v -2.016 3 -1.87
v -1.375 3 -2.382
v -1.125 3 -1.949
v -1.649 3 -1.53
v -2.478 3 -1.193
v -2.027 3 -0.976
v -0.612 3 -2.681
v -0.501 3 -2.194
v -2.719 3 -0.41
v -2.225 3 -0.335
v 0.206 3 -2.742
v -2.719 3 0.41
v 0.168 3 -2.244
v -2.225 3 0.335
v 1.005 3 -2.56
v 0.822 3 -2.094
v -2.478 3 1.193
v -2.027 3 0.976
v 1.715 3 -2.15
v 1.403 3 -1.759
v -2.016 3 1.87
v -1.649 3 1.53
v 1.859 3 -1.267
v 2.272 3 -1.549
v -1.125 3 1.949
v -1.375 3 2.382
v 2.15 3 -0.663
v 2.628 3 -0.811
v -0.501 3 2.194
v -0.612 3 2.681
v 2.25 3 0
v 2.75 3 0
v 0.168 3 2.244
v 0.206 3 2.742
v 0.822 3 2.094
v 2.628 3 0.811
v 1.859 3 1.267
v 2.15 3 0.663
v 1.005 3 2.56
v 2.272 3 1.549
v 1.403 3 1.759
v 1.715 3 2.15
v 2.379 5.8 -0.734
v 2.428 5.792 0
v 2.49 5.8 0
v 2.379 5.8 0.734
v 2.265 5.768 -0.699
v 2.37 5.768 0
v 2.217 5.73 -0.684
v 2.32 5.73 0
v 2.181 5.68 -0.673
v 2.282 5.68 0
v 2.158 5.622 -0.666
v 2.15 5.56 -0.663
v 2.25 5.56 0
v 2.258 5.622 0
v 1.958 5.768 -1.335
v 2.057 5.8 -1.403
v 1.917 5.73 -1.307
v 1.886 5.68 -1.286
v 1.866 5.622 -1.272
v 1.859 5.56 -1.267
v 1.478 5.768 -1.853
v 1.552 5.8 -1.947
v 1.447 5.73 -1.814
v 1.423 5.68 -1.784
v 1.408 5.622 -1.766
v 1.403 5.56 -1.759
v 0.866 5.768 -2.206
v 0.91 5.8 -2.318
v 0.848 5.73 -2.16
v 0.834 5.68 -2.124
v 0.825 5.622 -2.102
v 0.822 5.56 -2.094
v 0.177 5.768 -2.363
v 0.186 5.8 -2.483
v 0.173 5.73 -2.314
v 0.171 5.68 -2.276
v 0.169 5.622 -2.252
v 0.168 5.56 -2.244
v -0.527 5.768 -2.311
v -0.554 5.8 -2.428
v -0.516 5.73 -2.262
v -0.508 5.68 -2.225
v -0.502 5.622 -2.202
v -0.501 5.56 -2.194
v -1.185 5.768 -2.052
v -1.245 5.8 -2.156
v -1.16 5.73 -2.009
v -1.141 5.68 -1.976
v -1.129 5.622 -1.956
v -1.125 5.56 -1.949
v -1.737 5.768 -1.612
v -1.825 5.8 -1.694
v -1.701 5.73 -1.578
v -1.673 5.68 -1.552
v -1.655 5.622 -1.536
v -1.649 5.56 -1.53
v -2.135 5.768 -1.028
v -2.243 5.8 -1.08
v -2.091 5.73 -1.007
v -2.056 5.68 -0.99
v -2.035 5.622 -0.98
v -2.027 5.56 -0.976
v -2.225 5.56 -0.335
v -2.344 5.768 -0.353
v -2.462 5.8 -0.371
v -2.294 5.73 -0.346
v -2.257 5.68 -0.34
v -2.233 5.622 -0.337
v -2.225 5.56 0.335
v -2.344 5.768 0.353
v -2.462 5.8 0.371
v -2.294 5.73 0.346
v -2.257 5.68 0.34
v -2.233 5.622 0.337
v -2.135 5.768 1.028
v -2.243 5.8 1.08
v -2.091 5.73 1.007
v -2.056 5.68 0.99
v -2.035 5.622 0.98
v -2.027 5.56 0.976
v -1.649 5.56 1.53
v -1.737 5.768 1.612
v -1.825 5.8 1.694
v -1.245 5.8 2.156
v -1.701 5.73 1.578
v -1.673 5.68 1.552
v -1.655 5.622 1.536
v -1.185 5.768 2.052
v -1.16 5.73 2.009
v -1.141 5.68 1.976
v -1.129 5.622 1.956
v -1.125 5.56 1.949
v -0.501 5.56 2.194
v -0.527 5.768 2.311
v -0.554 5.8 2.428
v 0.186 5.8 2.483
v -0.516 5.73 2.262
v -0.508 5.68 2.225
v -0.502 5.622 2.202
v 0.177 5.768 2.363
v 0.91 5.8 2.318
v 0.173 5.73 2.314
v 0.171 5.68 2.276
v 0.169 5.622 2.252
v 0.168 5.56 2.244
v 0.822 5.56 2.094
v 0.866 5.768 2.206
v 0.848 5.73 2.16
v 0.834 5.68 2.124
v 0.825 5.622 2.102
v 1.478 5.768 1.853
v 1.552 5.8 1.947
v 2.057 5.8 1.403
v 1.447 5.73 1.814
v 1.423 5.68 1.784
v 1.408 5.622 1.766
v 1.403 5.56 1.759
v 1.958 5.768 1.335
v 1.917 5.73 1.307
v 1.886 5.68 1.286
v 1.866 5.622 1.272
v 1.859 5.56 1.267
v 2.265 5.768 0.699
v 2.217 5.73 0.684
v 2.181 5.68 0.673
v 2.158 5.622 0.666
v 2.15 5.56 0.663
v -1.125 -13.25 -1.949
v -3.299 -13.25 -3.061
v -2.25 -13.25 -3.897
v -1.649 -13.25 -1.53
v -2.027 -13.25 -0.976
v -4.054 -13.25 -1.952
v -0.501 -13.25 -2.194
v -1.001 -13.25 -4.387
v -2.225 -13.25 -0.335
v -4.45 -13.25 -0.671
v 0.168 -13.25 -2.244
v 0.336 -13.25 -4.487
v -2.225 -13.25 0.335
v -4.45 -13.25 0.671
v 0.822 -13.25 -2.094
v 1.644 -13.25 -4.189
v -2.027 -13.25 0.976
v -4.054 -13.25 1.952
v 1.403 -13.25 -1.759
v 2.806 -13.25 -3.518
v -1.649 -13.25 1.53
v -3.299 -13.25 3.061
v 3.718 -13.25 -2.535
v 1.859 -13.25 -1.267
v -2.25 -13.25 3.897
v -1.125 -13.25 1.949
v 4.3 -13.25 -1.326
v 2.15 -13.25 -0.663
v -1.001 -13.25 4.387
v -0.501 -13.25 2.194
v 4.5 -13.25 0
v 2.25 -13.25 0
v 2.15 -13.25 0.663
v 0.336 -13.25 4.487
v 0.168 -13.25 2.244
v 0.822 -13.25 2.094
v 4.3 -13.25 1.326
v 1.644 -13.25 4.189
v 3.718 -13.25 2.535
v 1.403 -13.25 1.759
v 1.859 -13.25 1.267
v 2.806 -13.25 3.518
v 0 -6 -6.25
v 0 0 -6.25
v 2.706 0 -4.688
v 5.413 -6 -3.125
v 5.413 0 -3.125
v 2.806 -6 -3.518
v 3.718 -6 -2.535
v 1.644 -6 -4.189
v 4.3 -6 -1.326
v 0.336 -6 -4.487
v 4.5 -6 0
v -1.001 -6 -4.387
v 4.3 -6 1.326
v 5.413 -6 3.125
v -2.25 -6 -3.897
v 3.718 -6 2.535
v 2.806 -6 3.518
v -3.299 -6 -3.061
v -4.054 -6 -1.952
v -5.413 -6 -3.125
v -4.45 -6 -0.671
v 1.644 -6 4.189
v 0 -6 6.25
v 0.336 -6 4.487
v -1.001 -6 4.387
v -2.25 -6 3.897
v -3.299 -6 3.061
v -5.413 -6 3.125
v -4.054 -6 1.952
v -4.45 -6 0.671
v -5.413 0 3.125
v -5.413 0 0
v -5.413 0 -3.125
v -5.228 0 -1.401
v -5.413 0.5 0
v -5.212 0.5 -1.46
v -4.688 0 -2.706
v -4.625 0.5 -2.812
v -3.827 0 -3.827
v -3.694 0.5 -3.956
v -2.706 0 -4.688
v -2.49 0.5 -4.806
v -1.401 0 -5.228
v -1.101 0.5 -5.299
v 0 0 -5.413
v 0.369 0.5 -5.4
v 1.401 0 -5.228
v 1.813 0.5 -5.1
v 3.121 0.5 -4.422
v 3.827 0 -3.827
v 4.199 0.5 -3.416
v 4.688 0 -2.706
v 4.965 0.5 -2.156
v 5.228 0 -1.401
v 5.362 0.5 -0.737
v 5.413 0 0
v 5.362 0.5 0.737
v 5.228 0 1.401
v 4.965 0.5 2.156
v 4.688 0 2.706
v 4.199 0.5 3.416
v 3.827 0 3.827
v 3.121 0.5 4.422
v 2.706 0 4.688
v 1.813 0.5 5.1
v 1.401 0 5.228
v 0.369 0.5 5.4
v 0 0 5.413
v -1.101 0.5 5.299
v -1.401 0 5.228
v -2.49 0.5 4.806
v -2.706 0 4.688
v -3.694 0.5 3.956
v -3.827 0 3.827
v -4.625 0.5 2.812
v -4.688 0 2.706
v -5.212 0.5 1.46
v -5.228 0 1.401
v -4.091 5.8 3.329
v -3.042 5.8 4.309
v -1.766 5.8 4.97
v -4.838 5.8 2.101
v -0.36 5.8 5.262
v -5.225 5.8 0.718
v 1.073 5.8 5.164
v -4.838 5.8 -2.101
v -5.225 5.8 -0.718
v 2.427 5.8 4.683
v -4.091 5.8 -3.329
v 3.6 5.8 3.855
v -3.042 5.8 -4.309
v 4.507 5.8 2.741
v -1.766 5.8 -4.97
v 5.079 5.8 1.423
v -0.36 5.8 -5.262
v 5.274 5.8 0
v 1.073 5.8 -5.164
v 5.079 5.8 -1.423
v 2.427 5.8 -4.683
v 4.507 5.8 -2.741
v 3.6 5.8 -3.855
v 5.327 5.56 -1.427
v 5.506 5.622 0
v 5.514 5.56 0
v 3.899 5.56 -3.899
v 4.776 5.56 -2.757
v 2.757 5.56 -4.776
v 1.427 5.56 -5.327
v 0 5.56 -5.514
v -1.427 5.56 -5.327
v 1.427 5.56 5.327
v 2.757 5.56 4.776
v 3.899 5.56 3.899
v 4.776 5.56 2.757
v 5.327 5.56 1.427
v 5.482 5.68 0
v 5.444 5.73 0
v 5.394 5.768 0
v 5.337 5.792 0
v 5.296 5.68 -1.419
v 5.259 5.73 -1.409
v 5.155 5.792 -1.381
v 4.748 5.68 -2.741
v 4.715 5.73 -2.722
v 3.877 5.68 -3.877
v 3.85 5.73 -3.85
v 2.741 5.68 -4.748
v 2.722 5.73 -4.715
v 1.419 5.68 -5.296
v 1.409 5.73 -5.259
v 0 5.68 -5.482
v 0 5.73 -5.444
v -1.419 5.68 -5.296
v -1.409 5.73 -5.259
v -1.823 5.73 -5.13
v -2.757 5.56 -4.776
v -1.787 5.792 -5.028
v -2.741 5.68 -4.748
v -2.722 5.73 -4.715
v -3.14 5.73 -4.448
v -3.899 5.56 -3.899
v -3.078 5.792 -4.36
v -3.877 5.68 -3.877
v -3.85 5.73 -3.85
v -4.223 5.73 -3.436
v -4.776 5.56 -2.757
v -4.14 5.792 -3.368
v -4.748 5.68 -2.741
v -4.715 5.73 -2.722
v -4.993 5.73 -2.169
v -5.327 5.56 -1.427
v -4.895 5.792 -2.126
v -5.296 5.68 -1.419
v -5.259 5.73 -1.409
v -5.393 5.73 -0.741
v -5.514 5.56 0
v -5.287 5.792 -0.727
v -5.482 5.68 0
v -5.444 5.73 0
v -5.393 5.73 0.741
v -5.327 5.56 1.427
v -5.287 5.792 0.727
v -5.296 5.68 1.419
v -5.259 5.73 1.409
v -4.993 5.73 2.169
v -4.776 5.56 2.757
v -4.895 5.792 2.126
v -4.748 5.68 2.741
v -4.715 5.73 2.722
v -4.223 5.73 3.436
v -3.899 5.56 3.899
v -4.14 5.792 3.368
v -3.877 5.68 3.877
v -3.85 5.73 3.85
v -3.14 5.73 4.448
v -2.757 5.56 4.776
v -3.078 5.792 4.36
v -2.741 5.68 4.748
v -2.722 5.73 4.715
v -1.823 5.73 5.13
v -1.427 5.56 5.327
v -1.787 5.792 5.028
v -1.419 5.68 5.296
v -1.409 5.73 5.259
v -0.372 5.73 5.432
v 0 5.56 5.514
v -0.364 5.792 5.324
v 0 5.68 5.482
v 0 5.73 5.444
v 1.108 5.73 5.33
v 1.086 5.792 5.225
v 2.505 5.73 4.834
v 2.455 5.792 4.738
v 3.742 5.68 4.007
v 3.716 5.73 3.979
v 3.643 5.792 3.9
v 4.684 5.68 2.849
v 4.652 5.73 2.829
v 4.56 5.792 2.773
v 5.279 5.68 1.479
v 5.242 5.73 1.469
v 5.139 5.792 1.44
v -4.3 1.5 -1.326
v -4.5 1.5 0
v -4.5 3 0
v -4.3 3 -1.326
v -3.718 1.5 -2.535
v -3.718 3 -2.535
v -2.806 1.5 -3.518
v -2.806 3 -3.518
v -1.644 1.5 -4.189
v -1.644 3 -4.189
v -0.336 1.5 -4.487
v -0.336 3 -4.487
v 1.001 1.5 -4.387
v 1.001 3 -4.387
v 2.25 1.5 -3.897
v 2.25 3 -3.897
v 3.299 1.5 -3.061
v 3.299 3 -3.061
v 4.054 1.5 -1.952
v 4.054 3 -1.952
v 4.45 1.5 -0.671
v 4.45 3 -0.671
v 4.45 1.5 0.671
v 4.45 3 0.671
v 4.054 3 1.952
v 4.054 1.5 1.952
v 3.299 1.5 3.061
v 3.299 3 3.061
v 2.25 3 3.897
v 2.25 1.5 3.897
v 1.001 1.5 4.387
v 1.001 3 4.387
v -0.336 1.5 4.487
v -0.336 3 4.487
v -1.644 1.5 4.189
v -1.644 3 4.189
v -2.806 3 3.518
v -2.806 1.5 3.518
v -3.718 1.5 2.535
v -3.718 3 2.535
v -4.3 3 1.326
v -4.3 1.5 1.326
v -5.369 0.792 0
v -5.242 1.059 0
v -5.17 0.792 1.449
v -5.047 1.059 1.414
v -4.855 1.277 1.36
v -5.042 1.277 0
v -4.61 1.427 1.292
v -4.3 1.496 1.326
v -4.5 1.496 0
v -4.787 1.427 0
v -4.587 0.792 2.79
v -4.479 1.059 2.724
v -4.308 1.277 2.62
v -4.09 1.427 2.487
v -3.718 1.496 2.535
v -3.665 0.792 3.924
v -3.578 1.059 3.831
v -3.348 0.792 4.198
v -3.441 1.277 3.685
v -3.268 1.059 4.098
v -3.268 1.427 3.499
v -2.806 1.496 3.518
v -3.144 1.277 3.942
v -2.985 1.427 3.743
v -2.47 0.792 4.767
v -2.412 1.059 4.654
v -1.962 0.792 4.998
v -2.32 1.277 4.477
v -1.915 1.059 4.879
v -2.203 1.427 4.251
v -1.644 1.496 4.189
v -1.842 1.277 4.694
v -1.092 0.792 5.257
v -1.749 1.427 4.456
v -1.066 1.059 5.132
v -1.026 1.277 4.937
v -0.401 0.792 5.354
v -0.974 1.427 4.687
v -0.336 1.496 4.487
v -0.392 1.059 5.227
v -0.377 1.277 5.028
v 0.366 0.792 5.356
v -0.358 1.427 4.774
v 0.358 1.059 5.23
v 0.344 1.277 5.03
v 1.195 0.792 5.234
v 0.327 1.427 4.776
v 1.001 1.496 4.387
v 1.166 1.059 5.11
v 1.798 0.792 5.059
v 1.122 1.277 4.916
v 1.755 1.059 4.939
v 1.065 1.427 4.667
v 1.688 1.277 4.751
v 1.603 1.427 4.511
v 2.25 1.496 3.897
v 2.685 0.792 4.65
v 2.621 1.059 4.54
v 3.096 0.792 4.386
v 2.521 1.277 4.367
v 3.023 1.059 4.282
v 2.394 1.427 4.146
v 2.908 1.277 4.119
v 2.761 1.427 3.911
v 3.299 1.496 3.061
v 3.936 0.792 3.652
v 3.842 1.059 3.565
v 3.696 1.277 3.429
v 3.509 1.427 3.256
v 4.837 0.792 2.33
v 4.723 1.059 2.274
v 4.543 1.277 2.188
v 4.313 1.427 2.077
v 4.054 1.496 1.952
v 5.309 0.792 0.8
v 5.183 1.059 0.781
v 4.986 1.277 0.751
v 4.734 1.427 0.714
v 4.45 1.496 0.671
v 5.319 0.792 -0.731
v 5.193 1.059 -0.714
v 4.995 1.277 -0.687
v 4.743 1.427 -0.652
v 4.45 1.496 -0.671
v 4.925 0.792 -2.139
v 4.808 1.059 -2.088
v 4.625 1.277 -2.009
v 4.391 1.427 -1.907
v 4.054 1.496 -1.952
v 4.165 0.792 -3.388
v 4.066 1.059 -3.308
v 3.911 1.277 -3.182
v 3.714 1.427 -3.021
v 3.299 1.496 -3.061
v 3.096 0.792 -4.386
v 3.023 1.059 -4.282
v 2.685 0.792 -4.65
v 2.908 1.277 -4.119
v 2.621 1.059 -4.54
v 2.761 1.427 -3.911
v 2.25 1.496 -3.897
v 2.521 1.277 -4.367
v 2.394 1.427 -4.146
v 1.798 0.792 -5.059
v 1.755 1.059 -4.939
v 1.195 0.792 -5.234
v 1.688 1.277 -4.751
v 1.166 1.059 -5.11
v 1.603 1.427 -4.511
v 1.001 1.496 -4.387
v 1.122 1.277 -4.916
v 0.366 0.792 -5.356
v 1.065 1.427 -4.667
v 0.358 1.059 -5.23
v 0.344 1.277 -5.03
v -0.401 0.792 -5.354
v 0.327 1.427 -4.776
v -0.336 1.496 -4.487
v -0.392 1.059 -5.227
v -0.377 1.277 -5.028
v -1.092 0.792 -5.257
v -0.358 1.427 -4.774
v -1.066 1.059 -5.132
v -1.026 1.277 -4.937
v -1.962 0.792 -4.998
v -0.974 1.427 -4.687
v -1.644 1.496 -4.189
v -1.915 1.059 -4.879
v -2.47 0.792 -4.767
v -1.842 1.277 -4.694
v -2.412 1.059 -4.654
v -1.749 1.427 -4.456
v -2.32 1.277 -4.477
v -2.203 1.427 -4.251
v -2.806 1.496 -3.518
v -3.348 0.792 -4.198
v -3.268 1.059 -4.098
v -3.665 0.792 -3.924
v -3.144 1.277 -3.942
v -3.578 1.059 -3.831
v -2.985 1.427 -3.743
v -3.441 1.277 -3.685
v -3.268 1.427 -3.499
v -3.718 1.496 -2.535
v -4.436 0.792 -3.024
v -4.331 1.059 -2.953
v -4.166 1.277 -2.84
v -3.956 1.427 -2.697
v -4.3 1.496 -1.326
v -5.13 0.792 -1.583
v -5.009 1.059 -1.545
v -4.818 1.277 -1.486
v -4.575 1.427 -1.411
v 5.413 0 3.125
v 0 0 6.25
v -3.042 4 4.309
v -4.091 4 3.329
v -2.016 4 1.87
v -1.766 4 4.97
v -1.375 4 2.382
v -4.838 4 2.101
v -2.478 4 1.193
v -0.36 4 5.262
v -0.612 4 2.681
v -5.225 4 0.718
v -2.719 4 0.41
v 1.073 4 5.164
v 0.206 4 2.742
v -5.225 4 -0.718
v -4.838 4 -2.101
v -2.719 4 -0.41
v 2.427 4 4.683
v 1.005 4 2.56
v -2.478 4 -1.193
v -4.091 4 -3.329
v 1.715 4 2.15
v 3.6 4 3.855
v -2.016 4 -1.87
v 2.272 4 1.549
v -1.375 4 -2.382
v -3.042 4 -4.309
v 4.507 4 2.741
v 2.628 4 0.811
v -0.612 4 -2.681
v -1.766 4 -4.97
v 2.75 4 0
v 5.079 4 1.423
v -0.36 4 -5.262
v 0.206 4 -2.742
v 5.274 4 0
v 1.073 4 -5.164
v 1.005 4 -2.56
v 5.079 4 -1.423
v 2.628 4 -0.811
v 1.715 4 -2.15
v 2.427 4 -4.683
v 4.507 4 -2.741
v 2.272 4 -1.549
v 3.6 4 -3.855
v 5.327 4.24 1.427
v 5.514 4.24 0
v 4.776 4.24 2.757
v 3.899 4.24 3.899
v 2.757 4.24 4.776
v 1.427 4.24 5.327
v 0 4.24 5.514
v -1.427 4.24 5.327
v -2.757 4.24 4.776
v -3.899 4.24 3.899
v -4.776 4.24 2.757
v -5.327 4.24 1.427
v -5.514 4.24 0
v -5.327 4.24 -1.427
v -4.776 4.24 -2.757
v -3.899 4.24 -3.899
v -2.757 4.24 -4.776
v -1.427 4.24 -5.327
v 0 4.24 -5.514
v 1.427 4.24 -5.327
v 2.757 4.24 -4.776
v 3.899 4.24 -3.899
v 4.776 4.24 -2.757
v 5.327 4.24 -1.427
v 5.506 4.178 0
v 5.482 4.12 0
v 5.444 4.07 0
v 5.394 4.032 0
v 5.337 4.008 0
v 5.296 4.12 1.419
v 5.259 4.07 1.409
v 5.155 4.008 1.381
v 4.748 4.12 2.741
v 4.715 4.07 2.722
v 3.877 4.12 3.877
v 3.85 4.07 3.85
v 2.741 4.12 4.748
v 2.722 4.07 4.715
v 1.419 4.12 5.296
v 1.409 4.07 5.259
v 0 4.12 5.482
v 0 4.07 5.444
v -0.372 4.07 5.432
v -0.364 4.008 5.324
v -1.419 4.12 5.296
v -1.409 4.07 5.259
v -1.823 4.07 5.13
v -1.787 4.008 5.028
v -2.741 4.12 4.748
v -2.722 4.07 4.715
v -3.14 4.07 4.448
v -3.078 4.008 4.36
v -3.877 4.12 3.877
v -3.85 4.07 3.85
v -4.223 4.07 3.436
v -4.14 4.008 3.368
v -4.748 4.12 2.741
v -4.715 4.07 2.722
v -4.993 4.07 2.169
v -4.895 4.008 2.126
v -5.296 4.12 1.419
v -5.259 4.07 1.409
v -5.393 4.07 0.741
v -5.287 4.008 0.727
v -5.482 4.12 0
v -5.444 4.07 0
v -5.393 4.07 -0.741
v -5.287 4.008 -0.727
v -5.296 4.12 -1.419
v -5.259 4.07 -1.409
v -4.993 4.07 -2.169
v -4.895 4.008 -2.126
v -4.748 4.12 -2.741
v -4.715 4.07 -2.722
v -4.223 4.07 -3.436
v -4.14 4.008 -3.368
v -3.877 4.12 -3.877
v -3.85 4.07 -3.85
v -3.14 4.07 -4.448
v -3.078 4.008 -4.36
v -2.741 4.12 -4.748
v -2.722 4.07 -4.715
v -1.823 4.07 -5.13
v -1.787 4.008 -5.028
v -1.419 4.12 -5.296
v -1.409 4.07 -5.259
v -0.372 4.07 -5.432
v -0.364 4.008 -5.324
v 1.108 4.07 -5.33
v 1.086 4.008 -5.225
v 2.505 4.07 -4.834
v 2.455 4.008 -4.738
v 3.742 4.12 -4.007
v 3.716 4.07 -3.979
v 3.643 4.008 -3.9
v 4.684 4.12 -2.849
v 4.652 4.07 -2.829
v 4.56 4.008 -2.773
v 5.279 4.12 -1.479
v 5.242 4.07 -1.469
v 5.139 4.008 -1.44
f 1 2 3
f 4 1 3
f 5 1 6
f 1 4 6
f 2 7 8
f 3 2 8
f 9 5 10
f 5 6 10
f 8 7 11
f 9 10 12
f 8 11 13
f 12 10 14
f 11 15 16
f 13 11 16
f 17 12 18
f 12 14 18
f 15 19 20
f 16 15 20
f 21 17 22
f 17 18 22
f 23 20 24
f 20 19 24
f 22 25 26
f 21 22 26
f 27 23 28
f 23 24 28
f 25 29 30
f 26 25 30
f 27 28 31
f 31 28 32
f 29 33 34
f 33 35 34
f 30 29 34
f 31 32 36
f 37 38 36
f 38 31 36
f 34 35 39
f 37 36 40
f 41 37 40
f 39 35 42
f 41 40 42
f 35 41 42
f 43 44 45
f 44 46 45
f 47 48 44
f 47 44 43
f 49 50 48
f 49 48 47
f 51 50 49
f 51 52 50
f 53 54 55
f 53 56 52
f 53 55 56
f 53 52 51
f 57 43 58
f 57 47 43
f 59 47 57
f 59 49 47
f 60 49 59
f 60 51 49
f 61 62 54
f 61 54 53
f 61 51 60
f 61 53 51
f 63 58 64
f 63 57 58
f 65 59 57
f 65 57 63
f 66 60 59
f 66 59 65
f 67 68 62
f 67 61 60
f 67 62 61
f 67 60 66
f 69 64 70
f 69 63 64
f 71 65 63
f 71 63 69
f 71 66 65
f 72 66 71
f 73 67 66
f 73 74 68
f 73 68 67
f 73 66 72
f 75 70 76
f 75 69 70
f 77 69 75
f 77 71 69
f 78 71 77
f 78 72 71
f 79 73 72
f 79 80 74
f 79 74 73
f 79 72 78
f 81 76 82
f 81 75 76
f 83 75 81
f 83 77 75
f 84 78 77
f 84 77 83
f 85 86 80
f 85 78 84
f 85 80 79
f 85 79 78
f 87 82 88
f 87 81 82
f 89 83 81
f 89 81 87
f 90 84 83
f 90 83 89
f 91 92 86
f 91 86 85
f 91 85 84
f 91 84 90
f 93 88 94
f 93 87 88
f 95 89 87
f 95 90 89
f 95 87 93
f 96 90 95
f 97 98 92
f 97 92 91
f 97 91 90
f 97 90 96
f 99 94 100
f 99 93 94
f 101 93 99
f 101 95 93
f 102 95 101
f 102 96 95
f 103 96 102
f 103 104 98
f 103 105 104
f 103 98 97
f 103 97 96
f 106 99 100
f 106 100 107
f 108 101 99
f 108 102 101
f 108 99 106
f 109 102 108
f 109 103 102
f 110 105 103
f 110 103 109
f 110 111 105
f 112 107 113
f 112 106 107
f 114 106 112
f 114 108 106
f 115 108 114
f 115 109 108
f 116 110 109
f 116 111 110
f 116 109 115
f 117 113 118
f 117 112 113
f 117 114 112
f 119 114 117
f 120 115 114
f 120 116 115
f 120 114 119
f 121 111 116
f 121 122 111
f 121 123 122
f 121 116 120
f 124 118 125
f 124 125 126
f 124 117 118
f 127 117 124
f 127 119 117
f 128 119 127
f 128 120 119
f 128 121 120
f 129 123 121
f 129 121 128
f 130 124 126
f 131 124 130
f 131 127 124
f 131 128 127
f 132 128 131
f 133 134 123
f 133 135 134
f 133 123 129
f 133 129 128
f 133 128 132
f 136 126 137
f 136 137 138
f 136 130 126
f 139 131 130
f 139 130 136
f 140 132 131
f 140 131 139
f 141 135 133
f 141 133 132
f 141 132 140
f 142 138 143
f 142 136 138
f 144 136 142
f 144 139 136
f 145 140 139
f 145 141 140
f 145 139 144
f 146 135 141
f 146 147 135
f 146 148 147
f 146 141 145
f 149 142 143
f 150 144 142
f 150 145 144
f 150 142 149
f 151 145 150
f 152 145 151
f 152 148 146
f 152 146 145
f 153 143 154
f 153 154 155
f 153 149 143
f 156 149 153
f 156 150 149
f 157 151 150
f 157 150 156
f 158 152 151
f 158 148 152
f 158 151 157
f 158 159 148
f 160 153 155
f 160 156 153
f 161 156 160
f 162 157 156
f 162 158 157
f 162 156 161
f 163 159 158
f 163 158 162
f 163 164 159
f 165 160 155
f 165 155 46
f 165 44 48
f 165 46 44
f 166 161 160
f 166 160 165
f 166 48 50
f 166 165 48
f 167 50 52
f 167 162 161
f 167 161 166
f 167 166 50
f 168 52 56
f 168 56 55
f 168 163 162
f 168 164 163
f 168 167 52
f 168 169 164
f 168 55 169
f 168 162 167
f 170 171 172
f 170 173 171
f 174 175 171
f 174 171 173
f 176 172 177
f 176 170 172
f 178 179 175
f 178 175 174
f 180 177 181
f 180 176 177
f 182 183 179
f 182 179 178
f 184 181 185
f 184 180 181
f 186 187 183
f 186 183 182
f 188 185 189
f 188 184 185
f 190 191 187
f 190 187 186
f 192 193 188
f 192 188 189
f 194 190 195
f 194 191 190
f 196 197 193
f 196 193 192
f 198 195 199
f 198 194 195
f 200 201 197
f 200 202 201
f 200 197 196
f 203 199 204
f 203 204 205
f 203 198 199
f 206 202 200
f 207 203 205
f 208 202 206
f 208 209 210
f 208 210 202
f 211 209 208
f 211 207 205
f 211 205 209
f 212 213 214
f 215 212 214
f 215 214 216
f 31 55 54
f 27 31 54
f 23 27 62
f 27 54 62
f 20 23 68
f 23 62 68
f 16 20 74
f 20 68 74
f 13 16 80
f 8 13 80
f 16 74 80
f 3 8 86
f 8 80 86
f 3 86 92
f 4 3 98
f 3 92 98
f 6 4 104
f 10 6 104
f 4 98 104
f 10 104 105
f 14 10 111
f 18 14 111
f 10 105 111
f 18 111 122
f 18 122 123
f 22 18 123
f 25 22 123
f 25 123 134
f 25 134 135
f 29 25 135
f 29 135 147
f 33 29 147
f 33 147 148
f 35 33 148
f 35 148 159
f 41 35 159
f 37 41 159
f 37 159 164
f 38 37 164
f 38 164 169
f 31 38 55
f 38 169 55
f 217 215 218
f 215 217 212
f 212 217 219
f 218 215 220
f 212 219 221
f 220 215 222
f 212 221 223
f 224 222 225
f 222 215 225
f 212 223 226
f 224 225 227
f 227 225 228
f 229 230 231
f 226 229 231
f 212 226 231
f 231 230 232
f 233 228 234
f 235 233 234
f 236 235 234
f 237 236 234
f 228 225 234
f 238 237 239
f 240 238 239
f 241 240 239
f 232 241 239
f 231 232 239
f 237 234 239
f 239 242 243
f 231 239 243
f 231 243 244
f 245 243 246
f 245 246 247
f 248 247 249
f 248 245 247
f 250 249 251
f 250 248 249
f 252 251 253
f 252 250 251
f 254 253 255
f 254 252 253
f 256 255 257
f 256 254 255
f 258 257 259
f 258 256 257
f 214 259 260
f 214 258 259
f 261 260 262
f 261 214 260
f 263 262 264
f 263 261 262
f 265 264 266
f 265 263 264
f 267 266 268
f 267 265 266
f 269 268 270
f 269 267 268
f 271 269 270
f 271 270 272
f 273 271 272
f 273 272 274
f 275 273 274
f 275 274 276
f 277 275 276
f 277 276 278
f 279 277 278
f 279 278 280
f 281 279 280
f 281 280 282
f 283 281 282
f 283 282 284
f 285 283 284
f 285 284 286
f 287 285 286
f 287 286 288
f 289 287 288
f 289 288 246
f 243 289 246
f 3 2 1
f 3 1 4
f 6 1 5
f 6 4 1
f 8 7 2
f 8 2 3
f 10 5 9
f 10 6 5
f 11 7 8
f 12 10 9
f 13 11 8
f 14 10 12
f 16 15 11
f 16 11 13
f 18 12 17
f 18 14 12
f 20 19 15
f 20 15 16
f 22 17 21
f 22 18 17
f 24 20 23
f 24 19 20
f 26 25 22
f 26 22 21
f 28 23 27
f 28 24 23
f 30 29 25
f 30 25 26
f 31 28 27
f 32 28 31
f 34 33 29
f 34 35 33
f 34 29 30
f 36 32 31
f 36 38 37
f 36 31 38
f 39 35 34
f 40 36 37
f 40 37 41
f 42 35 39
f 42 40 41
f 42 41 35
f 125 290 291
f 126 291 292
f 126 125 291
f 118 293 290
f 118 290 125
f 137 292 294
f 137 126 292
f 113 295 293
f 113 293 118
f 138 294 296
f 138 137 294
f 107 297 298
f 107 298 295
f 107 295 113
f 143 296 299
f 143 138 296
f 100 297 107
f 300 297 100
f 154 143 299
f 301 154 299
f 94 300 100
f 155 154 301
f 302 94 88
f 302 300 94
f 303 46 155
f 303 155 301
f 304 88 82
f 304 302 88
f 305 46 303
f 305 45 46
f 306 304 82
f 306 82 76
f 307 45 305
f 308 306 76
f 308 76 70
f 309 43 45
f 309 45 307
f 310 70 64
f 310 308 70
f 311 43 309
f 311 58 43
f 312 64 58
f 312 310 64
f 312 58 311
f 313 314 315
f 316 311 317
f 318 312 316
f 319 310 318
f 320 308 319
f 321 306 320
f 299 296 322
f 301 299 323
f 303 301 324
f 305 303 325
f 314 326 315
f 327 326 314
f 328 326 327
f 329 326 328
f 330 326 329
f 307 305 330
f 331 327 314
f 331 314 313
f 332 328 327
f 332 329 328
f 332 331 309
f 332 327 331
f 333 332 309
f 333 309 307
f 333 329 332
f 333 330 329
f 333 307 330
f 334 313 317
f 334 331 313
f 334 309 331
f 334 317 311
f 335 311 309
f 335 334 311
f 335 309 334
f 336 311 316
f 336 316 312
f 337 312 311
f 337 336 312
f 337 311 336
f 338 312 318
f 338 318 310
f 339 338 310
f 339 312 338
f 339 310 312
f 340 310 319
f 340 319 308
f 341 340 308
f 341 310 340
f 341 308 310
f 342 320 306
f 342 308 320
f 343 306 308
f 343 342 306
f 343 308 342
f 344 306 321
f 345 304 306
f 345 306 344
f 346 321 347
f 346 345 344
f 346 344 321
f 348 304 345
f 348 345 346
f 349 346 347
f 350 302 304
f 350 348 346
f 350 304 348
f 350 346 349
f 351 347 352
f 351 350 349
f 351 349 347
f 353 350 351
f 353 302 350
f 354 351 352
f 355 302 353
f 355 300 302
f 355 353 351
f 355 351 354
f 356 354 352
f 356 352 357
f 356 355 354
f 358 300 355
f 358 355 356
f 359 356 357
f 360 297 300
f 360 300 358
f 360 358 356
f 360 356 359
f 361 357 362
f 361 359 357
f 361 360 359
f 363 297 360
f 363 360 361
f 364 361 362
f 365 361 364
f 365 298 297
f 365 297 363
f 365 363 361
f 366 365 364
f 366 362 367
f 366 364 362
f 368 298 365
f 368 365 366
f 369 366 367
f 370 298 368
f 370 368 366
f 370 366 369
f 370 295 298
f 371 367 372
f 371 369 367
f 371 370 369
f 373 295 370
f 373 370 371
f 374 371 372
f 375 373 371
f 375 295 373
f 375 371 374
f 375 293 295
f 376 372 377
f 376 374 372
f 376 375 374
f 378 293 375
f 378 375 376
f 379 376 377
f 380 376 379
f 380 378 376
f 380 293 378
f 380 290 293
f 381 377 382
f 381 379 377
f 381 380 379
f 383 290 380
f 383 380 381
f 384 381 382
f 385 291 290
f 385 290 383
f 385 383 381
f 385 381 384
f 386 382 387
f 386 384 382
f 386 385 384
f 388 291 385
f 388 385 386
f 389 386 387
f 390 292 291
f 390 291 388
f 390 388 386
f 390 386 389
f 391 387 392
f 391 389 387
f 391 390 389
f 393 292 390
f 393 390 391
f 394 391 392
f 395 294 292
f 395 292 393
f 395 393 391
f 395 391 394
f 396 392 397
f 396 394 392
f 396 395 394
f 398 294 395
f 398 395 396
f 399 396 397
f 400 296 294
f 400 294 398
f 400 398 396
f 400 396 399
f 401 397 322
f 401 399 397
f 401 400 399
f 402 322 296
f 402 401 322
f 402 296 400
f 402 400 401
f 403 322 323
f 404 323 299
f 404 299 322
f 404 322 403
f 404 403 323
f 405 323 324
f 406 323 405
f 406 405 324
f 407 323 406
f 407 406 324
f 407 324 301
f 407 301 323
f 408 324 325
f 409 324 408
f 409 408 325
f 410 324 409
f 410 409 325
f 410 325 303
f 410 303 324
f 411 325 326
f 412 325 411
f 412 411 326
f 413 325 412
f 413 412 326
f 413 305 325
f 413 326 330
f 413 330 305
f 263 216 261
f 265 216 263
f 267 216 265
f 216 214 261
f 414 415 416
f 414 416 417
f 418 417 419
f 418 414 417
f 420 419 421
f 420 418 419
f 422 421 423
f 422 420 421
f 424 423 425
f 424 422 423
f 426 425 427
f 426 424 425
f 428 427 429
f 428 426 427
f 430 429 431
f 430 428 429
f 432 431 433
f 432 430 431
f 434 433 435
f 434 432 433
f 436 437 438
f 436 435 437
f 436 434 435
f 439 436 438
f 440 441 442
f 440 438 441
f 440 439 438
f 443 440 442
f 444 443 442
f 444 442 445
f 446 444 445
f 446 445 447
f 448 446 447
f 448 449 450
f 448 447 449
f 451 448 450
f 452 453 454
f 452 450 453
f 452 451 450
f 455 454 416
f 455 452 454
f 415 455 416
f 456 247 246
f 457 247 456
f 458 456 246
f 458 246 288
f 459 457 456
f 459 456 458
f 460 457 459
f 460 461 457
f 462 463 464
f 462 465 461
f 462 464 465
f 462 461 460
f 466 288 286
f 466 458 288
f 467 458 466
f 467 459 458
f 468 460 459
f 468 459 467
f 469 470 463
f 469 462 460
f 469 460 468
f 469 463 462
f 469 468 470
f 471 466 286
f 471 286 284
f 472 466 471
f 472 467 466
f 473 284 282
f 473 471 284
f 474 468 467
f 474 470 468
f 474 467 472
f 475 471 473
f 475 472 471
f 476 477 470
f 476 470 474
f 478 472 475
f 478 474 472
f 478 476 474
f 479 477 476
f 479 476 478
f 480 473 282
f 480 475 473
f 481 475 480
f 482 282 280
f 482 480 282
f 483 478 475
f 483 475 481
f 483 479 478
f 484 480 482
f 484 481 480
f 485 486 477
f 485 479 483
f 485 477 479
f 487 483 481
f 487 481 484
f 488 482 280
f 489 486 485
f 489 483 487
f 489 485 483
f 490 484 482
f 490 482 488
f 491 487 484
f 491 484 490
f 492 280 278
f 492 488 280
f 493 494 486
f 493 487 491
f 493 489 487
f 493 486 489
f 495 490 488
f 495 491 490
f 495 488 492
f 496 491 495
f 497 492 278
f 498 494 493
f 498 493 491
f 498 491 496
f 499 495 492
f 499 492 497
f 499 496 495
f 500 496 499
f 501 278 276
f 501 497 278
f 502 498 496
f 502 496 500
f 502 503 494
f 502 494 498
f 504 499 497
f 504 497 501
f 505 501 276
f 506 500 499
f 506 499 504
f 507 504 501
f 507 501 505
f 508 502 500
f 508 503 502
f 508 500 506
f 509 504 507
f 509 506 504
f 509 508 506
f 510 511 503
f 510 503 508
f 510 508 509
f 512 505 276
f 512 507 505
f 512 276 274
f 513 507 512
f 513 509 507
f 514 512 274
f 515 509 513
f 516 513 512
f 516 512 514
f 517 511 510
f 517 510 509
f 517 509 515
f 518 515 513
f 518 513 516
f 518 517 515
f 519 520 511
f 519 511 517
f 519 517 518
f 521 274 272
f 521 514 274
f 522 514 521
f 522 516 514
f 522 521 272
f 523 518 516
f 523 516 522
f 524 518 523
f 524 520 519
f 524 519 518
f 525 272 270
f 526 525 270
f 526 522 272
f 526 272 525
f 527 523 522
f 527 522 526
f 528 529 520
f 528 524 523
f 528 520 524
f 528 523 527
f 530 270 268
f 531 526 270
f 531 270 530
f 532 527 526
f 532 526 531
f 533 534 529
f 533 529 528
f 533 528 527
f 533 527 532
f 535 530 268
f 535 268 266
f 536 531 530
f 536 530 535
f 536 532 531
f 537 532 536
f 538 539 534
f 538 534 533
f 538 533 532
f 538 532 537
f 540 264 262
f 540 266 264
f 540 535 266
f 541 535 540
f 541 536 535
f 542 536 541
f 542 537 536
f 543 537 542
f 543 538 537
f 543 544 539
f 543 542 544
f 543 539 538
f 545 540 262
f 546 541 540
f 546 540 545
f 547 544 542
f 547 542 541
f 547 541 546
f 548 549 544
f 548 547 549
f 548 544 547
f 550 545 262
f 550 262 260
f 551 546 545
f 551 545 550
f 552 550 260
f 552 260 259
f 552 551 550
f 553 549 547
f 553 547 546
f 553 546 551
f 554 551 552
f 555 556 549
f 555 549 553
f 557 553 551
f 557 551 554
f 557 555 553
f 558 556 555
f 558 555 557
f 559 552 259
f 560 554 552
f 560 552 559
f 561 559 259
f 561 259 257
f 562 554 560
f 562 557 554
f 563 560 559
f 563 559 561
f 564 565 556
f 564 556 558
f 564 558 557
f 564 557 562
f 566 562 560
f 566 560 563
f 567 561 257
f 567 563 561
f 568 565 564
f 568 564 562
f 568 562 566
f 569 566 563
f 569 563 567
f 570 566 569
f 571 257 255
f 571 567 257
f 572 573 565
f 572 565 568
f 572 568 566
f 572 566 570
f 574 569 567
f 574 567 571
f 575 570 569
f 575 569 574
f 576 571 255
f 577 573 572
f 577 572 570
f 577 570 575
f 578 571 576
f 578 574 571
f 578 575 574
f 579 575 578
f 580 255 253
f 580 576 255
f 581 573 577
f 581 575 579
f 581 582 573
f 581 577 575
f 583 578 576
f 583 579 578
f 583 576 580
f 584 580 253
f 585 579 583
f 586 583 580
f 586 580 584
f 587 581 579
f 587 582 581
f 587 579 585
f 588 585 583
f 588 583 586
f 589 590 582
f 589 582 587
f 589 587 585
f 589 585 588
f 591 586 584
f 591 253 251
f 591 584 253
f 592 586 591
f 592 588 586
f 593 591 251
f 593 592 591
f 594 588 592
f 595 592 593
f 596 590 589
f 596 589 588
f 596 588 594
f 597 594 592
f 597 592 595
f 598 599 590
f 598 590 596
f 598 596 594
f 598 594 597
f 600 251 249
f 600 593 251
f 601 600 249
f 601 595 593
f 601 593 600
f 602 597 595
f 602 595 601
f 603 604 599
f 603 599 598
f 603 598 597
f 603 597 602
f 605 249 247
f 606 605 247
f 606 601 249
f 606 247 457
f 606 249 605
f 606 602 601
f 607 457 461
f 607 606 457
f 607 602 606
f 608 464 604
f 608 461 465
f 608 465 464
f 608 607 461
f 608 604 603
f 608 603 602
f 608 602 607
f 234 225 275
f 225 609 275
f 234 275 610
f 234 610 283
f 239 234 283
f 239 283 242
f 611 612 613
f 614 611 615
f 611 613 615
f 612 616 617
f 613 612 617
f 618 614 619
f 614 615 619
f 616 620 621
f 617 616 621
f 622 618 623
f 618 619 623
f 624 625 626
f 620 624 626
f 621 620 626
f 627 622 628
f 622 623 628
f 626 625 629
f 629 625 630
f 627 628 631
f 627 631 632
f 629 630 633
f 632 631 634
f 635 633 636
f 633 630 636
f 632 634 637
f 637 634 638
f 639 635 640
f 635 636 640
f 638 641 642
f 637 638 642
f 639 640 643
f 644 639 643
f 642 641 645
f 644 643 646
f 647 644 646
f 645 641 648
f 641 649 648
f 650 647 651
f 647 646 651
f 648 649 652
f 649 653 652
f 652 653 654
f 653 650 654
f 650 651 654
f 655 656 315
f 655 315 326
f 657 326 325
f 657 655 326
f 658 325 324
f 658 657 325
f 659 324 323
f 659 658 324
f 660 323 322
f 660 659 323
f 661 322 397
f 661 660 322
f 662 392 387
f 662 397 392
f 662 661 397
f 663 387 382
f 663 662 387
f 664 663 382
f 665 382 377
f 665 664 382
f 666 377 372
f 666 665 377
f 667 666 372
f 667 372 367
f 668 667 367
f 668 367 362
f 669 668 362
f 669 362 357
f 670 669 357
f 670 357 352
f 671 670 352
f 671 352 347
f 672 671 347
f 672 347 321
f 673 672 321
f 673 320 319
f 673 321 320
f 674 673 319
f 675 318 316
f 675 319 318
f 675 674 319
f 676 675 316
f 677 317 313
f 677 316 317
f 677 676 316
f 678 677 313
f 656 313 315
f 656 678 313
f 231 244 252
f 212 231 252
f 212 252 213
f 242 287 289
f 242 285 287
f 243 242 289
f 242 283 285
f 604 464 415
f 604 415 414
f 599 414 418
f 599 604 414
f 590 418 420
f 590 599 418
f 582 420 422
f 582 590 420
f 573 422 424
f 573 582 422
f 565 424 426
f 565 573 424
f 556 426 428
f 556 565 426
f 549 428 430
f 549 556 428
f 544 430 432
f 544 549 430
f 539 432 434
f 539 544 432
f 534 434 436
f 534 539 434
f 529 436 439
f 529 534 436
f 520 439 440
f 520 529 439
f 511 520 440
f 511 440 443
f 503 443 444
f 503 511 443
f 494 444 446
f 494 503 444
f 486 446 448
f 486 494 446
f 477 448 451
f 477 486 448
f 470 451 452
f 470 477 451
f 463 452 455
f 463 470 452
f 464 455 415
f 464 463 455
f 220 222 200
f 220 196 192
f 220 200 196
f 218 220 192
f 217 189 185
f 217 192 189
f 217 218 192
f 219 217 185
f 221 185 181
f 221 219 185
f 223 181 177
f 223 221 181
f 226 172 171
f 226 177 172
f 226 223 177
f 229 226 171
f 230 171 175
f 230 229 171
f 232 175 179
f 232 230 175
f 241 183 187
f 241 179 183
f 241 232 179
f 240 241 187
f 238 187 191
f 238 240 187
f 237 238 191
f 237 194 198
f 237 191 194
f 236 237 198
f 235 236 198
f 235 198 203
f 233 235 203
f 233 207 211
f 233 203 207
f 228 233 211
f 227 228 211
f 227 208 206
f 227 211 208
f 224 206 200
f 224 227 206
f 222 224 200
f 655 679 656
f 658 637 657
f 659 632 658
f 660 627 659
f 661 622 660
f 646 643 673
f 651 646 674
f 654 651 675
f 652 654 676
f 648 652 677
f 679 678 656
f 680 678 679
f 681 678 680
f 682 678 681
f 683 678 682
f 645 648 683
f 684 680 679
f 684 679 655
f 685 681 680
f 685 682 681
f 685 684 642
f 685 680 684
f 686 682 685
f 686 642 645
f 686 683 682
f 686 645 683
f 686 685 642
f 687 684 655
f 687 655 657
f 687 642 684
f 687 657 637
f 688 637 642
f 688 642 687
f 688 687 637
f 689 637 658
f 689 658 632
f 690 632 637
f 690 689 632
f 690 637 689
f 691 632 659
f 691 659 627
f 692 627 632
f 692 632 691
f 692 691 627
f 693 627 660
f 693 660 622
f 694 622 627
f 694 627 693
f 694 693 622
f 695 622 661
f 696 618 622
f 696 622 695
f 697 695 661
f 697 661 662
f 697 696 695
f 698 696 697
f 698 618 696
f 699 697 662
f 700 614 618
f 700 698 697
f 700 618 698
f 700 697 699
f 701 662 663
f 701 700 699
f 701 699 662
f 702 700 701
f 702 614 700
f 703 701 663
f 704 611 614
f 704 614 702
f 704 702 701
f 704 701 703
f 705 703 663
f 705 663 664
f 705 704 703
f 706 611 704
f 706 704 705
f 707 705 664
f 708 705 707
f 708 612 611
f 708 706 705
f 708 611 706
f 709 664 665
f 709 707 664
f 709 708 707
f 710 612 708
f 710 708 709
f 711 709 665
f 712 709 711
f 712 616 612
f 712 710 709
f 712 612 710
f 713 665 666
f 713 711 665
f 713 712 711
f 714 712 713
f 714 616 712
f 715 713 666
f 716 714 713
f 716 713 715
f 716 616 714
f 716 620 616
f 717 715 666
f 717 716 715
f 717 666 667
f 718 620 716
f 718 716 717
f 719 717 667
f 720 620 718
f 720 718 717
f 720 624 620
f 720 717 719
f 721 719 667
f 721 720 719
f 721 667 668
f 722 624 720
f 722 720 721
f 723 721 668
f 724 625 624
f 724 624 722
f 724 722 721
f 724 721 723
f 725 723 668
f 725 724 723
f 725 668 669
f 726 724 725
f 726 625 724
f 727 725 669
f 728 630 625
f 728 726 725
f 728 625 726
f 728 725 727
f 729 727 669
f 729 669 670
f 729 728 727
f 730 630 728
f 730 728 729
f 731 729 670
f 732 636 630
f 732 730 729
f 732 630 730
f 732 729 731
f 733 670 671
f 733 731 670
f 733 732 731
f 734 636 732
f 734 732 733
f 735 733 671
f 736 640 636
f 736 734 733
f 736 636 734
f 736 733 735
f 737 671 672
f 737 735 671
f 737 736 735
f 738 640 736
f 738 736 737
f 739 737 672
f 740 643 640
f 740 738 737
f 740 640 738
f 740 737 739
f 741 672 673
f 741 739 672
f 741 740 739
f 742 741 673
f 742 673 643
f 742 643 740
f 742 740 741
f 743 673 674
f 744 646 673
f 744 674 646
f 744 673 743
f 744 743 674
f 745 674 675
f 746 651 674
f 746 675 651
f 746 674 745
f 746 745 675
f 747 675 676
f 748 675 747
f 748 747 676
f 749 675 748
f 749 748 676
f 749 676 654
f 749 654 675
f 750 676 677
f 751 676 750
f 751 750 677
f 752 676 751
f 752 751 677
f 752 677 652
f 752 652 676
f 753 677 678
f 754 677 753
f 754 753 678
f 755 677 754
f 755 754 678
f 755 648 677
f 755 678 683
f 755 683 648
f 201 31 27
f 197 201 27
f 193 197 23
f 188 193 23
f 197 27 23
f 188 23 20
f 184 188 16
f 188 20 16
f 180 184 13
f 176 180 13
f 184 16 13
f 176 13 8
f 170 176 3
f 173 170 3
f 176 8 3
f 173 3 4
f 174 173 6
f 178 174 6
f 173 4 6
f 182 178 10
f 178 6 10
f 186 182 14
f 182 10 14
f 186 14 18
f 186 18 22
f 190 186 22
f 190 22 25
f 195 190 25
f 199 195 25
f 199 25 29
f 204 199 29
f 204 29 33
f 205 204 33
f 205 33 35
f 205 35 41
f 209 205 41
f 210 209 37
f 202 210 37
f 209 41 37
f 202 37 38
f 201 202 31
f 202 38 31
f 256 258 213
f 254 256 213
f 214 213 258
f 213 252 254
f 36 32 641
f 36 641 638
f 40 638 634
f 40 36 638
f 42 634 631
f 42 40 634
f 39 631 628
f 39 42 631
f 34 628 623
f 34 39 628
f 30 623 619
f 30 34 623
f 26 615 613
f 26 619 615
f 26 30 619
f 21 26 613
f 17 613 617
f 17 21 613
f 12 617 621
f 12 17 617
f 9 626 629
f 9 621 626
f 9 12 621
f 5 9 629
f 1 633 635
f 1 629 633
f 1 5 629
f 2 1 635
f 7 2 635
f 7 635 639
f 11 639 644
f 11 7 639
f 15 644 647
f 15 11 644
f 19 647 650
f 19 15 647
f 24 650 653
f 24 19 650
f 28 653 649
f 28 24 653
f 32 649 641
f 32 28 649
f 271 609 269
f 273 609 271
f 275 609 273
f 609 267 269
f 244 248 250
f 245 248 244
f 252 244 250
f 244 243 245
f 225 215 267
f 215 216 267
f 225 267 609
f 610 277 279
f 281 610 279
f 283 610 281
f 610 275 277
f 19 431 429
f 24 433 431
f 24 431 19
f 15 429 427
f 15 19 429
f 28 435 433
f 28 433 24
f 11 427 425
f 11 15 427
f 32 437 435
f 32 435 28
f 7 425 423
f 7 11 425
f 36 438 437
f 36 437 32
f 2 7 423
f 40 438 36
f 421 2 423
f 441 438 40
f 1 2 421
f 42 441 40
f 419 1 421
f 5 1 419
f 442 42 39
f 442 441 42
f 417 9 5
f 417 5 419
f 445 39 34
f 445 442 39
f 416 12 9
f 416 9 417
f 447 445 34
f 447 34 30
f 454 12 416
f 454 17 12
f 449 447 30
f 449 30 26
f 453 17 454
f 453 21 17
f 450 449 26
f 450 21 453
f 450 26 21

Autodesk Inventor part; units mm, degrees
ref_plane "YZ Plane" through (0, 0, 0) normal (1, 0, 0) x (0, 1, 0)
ref_plane "XZ Plane" through (0, 0, 0) normal (0, 1, 0) x (-1, 0, 0)
ref_plane "XY Plane" through (0, 0, 0) normal (0, 0, 1) x (1, 0, 0)
sketch "Sketch1" plane through (0, 0, 0) normal (0, 1, 0) x (-1, 0, 0)
  line L0 (0, 0) -> (0, -6.25) construction
  line L1 (0, -6.25) -> (-5.4127, -3.125) construction
  line L2 (-5.4127, -3.125) -> (-5.4127, 3.125) construction
  line L3 (-5.4127, 3.125) -> (0, 6.25) construction
  line L4 (0, 6.25) -> (5.4127, 3.125) construction
  line L5 (5.4127, 3.125) -> (5.4127, -3.125) construction
  line L6 (5.4127, -3.125) -> (0, -6.25) construction
  line L7 (5.4127, 3.125) -> (5.4127, -3.125)
  line L8 (5.4127, -3.125) -> (0, -6.25)
  line L9 (0, -6.25) -> (-5.4127, -3.125)
  line L10 (-5.4127, -3.125) -> (-5.4127, 3.125)
  line L11 (-5.4127, 3.125) -> (0, 6.25)
  line L12 (0, 6.25) -> (5.4127, 3.125)
  circle A0 centre (0, 0) radius 4.5
  circle A1 centre (0, 0) radius 5.4127
  circle A2 centre (0, 0) radius 4
  dimension "d0" = 6.25
  dimension "d1" = 9
  dimension "d2" = 8
extrude "Extrusion1" add sketch "Sketch1" along normal blind 3 contours A0 | A2
extrude "Extrusion2" add sketch "Sketch1" along normal blind 1.5 contours A1
extrude "Extrusion3" add sketch "Sketch1" against normal blind 6 contours L7 A1 L12 | A1 | L7 L8 A1 | A1 L11 L12 | L8 L9 A1 | A1 L10 L11 | L9 L10 A1 | A0 | A2
fillet "Fillet1" radius 1 1 edges at (5.4127, 1.5, 0)
sketch "Sketch2" plane through (0, -6, 0) normal (0, -1, 0) x (1, 0, 0)
  circle A0 centre (0, 0) radius 4.5
  dimension "d10" = 9
extrude "Extrusion4" add sketch "Sketch2" along normal blind 7.25
thread "Thread1" size "M9x1" class "6g" standard "ANSI Metric M Profile" length 7.25
sketch "Sketch3" plane through (0, 3, 0) normal (0, 1, 0) x (1, 0, 0)
  circle A0 centre (0, 0) radius 2.75
  dimension "d15" = 5.5
extrude "Extrusion5" add sketch "Sketch3" along normal blind 1
sketch "Sketch4" plane through (0, 4, 0) normal (0, 1, 0) x (1, 0, 0)
  circle A0 centre (0, 0) radius 5.5145
extrude "Extrusion6" add sketch "Sketch4" along normal blind 1.8
sketch "Sketch5" plane through (0, 5.8, 0) normal (0, 1, 0) x (1, 0, 0)
  circle A0 centre (0, 0) radius 2.25
  dimension "d20" = 4.5
extrude "Extrusion7" cut sketch "Sketch5" against normal blind 20
fillet "Fillet2" radius 0.24 3 edges at (-5.5145, 5.8, 0) (-5.5145, 4, 0) (-2.25, 5.8, 0)
ref_plane "Work Plane1" through (0, 3, 0) normal (0, 1, 0) x (1, 0, 0)
split body "Split1" result two bodies by plane through (0, 3, 0) normal (0, 1, 0) first body at (4.2712, 5.3, 0.6194)
properties part number "bowden-adapter-coldend" material "Aluminum 6061"
